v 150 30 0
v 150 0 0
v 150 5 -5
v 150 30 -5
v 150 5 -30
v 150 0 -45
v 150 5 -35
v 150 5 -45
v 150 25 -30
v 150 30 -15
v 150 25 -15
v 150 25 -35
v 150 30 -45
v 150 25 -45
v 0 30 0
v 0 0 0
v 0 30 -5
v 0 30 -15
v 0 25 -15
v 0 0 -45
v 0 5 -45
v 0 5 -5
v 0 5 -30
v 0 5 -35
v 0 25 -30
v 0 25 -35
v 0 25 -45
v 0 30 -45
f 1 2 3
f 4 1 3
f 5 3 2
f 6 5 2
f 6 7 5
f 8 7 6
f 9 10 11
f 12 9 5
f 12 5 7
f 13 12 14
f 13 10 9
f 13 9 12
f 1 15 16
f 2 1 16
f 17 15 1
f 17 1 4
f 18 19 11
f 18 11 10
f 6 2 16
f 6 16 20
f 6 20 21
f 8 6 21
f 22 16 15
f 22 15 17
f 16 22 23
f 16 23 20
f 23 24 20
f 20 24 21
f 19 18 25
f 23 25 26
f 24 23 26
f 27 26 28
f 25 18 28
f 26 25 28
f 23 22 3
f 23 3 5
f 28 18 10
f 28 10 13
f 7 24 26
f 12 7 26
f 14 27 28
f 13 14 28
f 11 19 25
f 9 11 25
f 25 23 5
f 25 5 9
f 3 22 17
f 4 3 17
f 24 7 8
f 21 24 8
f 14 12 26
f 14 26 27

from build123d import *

# Parameters (mm, degrees)
EXTRUDE_1_DEPTH = 150


with BuildPart() as part:
    # Эскиз1 → Бобышка-Вытянуть1 (new body)
    with BuildSketch(Plane(origin=(0, 0, 0), x_dir=(0, 0, -1), z_dir=(1, 0, 0))):
        Polygon((0, 0), (45, 0), (45, 5), (35, 5), (35, 25), (45, 25), (45, 30), (15, 30), (15, 25), (30, 25), (30, 5), (5, 5), (5, 30), (0, 30), align=None)
    extrude(amount=EXTRUDE_1_DEPTH)


solid = part.part
